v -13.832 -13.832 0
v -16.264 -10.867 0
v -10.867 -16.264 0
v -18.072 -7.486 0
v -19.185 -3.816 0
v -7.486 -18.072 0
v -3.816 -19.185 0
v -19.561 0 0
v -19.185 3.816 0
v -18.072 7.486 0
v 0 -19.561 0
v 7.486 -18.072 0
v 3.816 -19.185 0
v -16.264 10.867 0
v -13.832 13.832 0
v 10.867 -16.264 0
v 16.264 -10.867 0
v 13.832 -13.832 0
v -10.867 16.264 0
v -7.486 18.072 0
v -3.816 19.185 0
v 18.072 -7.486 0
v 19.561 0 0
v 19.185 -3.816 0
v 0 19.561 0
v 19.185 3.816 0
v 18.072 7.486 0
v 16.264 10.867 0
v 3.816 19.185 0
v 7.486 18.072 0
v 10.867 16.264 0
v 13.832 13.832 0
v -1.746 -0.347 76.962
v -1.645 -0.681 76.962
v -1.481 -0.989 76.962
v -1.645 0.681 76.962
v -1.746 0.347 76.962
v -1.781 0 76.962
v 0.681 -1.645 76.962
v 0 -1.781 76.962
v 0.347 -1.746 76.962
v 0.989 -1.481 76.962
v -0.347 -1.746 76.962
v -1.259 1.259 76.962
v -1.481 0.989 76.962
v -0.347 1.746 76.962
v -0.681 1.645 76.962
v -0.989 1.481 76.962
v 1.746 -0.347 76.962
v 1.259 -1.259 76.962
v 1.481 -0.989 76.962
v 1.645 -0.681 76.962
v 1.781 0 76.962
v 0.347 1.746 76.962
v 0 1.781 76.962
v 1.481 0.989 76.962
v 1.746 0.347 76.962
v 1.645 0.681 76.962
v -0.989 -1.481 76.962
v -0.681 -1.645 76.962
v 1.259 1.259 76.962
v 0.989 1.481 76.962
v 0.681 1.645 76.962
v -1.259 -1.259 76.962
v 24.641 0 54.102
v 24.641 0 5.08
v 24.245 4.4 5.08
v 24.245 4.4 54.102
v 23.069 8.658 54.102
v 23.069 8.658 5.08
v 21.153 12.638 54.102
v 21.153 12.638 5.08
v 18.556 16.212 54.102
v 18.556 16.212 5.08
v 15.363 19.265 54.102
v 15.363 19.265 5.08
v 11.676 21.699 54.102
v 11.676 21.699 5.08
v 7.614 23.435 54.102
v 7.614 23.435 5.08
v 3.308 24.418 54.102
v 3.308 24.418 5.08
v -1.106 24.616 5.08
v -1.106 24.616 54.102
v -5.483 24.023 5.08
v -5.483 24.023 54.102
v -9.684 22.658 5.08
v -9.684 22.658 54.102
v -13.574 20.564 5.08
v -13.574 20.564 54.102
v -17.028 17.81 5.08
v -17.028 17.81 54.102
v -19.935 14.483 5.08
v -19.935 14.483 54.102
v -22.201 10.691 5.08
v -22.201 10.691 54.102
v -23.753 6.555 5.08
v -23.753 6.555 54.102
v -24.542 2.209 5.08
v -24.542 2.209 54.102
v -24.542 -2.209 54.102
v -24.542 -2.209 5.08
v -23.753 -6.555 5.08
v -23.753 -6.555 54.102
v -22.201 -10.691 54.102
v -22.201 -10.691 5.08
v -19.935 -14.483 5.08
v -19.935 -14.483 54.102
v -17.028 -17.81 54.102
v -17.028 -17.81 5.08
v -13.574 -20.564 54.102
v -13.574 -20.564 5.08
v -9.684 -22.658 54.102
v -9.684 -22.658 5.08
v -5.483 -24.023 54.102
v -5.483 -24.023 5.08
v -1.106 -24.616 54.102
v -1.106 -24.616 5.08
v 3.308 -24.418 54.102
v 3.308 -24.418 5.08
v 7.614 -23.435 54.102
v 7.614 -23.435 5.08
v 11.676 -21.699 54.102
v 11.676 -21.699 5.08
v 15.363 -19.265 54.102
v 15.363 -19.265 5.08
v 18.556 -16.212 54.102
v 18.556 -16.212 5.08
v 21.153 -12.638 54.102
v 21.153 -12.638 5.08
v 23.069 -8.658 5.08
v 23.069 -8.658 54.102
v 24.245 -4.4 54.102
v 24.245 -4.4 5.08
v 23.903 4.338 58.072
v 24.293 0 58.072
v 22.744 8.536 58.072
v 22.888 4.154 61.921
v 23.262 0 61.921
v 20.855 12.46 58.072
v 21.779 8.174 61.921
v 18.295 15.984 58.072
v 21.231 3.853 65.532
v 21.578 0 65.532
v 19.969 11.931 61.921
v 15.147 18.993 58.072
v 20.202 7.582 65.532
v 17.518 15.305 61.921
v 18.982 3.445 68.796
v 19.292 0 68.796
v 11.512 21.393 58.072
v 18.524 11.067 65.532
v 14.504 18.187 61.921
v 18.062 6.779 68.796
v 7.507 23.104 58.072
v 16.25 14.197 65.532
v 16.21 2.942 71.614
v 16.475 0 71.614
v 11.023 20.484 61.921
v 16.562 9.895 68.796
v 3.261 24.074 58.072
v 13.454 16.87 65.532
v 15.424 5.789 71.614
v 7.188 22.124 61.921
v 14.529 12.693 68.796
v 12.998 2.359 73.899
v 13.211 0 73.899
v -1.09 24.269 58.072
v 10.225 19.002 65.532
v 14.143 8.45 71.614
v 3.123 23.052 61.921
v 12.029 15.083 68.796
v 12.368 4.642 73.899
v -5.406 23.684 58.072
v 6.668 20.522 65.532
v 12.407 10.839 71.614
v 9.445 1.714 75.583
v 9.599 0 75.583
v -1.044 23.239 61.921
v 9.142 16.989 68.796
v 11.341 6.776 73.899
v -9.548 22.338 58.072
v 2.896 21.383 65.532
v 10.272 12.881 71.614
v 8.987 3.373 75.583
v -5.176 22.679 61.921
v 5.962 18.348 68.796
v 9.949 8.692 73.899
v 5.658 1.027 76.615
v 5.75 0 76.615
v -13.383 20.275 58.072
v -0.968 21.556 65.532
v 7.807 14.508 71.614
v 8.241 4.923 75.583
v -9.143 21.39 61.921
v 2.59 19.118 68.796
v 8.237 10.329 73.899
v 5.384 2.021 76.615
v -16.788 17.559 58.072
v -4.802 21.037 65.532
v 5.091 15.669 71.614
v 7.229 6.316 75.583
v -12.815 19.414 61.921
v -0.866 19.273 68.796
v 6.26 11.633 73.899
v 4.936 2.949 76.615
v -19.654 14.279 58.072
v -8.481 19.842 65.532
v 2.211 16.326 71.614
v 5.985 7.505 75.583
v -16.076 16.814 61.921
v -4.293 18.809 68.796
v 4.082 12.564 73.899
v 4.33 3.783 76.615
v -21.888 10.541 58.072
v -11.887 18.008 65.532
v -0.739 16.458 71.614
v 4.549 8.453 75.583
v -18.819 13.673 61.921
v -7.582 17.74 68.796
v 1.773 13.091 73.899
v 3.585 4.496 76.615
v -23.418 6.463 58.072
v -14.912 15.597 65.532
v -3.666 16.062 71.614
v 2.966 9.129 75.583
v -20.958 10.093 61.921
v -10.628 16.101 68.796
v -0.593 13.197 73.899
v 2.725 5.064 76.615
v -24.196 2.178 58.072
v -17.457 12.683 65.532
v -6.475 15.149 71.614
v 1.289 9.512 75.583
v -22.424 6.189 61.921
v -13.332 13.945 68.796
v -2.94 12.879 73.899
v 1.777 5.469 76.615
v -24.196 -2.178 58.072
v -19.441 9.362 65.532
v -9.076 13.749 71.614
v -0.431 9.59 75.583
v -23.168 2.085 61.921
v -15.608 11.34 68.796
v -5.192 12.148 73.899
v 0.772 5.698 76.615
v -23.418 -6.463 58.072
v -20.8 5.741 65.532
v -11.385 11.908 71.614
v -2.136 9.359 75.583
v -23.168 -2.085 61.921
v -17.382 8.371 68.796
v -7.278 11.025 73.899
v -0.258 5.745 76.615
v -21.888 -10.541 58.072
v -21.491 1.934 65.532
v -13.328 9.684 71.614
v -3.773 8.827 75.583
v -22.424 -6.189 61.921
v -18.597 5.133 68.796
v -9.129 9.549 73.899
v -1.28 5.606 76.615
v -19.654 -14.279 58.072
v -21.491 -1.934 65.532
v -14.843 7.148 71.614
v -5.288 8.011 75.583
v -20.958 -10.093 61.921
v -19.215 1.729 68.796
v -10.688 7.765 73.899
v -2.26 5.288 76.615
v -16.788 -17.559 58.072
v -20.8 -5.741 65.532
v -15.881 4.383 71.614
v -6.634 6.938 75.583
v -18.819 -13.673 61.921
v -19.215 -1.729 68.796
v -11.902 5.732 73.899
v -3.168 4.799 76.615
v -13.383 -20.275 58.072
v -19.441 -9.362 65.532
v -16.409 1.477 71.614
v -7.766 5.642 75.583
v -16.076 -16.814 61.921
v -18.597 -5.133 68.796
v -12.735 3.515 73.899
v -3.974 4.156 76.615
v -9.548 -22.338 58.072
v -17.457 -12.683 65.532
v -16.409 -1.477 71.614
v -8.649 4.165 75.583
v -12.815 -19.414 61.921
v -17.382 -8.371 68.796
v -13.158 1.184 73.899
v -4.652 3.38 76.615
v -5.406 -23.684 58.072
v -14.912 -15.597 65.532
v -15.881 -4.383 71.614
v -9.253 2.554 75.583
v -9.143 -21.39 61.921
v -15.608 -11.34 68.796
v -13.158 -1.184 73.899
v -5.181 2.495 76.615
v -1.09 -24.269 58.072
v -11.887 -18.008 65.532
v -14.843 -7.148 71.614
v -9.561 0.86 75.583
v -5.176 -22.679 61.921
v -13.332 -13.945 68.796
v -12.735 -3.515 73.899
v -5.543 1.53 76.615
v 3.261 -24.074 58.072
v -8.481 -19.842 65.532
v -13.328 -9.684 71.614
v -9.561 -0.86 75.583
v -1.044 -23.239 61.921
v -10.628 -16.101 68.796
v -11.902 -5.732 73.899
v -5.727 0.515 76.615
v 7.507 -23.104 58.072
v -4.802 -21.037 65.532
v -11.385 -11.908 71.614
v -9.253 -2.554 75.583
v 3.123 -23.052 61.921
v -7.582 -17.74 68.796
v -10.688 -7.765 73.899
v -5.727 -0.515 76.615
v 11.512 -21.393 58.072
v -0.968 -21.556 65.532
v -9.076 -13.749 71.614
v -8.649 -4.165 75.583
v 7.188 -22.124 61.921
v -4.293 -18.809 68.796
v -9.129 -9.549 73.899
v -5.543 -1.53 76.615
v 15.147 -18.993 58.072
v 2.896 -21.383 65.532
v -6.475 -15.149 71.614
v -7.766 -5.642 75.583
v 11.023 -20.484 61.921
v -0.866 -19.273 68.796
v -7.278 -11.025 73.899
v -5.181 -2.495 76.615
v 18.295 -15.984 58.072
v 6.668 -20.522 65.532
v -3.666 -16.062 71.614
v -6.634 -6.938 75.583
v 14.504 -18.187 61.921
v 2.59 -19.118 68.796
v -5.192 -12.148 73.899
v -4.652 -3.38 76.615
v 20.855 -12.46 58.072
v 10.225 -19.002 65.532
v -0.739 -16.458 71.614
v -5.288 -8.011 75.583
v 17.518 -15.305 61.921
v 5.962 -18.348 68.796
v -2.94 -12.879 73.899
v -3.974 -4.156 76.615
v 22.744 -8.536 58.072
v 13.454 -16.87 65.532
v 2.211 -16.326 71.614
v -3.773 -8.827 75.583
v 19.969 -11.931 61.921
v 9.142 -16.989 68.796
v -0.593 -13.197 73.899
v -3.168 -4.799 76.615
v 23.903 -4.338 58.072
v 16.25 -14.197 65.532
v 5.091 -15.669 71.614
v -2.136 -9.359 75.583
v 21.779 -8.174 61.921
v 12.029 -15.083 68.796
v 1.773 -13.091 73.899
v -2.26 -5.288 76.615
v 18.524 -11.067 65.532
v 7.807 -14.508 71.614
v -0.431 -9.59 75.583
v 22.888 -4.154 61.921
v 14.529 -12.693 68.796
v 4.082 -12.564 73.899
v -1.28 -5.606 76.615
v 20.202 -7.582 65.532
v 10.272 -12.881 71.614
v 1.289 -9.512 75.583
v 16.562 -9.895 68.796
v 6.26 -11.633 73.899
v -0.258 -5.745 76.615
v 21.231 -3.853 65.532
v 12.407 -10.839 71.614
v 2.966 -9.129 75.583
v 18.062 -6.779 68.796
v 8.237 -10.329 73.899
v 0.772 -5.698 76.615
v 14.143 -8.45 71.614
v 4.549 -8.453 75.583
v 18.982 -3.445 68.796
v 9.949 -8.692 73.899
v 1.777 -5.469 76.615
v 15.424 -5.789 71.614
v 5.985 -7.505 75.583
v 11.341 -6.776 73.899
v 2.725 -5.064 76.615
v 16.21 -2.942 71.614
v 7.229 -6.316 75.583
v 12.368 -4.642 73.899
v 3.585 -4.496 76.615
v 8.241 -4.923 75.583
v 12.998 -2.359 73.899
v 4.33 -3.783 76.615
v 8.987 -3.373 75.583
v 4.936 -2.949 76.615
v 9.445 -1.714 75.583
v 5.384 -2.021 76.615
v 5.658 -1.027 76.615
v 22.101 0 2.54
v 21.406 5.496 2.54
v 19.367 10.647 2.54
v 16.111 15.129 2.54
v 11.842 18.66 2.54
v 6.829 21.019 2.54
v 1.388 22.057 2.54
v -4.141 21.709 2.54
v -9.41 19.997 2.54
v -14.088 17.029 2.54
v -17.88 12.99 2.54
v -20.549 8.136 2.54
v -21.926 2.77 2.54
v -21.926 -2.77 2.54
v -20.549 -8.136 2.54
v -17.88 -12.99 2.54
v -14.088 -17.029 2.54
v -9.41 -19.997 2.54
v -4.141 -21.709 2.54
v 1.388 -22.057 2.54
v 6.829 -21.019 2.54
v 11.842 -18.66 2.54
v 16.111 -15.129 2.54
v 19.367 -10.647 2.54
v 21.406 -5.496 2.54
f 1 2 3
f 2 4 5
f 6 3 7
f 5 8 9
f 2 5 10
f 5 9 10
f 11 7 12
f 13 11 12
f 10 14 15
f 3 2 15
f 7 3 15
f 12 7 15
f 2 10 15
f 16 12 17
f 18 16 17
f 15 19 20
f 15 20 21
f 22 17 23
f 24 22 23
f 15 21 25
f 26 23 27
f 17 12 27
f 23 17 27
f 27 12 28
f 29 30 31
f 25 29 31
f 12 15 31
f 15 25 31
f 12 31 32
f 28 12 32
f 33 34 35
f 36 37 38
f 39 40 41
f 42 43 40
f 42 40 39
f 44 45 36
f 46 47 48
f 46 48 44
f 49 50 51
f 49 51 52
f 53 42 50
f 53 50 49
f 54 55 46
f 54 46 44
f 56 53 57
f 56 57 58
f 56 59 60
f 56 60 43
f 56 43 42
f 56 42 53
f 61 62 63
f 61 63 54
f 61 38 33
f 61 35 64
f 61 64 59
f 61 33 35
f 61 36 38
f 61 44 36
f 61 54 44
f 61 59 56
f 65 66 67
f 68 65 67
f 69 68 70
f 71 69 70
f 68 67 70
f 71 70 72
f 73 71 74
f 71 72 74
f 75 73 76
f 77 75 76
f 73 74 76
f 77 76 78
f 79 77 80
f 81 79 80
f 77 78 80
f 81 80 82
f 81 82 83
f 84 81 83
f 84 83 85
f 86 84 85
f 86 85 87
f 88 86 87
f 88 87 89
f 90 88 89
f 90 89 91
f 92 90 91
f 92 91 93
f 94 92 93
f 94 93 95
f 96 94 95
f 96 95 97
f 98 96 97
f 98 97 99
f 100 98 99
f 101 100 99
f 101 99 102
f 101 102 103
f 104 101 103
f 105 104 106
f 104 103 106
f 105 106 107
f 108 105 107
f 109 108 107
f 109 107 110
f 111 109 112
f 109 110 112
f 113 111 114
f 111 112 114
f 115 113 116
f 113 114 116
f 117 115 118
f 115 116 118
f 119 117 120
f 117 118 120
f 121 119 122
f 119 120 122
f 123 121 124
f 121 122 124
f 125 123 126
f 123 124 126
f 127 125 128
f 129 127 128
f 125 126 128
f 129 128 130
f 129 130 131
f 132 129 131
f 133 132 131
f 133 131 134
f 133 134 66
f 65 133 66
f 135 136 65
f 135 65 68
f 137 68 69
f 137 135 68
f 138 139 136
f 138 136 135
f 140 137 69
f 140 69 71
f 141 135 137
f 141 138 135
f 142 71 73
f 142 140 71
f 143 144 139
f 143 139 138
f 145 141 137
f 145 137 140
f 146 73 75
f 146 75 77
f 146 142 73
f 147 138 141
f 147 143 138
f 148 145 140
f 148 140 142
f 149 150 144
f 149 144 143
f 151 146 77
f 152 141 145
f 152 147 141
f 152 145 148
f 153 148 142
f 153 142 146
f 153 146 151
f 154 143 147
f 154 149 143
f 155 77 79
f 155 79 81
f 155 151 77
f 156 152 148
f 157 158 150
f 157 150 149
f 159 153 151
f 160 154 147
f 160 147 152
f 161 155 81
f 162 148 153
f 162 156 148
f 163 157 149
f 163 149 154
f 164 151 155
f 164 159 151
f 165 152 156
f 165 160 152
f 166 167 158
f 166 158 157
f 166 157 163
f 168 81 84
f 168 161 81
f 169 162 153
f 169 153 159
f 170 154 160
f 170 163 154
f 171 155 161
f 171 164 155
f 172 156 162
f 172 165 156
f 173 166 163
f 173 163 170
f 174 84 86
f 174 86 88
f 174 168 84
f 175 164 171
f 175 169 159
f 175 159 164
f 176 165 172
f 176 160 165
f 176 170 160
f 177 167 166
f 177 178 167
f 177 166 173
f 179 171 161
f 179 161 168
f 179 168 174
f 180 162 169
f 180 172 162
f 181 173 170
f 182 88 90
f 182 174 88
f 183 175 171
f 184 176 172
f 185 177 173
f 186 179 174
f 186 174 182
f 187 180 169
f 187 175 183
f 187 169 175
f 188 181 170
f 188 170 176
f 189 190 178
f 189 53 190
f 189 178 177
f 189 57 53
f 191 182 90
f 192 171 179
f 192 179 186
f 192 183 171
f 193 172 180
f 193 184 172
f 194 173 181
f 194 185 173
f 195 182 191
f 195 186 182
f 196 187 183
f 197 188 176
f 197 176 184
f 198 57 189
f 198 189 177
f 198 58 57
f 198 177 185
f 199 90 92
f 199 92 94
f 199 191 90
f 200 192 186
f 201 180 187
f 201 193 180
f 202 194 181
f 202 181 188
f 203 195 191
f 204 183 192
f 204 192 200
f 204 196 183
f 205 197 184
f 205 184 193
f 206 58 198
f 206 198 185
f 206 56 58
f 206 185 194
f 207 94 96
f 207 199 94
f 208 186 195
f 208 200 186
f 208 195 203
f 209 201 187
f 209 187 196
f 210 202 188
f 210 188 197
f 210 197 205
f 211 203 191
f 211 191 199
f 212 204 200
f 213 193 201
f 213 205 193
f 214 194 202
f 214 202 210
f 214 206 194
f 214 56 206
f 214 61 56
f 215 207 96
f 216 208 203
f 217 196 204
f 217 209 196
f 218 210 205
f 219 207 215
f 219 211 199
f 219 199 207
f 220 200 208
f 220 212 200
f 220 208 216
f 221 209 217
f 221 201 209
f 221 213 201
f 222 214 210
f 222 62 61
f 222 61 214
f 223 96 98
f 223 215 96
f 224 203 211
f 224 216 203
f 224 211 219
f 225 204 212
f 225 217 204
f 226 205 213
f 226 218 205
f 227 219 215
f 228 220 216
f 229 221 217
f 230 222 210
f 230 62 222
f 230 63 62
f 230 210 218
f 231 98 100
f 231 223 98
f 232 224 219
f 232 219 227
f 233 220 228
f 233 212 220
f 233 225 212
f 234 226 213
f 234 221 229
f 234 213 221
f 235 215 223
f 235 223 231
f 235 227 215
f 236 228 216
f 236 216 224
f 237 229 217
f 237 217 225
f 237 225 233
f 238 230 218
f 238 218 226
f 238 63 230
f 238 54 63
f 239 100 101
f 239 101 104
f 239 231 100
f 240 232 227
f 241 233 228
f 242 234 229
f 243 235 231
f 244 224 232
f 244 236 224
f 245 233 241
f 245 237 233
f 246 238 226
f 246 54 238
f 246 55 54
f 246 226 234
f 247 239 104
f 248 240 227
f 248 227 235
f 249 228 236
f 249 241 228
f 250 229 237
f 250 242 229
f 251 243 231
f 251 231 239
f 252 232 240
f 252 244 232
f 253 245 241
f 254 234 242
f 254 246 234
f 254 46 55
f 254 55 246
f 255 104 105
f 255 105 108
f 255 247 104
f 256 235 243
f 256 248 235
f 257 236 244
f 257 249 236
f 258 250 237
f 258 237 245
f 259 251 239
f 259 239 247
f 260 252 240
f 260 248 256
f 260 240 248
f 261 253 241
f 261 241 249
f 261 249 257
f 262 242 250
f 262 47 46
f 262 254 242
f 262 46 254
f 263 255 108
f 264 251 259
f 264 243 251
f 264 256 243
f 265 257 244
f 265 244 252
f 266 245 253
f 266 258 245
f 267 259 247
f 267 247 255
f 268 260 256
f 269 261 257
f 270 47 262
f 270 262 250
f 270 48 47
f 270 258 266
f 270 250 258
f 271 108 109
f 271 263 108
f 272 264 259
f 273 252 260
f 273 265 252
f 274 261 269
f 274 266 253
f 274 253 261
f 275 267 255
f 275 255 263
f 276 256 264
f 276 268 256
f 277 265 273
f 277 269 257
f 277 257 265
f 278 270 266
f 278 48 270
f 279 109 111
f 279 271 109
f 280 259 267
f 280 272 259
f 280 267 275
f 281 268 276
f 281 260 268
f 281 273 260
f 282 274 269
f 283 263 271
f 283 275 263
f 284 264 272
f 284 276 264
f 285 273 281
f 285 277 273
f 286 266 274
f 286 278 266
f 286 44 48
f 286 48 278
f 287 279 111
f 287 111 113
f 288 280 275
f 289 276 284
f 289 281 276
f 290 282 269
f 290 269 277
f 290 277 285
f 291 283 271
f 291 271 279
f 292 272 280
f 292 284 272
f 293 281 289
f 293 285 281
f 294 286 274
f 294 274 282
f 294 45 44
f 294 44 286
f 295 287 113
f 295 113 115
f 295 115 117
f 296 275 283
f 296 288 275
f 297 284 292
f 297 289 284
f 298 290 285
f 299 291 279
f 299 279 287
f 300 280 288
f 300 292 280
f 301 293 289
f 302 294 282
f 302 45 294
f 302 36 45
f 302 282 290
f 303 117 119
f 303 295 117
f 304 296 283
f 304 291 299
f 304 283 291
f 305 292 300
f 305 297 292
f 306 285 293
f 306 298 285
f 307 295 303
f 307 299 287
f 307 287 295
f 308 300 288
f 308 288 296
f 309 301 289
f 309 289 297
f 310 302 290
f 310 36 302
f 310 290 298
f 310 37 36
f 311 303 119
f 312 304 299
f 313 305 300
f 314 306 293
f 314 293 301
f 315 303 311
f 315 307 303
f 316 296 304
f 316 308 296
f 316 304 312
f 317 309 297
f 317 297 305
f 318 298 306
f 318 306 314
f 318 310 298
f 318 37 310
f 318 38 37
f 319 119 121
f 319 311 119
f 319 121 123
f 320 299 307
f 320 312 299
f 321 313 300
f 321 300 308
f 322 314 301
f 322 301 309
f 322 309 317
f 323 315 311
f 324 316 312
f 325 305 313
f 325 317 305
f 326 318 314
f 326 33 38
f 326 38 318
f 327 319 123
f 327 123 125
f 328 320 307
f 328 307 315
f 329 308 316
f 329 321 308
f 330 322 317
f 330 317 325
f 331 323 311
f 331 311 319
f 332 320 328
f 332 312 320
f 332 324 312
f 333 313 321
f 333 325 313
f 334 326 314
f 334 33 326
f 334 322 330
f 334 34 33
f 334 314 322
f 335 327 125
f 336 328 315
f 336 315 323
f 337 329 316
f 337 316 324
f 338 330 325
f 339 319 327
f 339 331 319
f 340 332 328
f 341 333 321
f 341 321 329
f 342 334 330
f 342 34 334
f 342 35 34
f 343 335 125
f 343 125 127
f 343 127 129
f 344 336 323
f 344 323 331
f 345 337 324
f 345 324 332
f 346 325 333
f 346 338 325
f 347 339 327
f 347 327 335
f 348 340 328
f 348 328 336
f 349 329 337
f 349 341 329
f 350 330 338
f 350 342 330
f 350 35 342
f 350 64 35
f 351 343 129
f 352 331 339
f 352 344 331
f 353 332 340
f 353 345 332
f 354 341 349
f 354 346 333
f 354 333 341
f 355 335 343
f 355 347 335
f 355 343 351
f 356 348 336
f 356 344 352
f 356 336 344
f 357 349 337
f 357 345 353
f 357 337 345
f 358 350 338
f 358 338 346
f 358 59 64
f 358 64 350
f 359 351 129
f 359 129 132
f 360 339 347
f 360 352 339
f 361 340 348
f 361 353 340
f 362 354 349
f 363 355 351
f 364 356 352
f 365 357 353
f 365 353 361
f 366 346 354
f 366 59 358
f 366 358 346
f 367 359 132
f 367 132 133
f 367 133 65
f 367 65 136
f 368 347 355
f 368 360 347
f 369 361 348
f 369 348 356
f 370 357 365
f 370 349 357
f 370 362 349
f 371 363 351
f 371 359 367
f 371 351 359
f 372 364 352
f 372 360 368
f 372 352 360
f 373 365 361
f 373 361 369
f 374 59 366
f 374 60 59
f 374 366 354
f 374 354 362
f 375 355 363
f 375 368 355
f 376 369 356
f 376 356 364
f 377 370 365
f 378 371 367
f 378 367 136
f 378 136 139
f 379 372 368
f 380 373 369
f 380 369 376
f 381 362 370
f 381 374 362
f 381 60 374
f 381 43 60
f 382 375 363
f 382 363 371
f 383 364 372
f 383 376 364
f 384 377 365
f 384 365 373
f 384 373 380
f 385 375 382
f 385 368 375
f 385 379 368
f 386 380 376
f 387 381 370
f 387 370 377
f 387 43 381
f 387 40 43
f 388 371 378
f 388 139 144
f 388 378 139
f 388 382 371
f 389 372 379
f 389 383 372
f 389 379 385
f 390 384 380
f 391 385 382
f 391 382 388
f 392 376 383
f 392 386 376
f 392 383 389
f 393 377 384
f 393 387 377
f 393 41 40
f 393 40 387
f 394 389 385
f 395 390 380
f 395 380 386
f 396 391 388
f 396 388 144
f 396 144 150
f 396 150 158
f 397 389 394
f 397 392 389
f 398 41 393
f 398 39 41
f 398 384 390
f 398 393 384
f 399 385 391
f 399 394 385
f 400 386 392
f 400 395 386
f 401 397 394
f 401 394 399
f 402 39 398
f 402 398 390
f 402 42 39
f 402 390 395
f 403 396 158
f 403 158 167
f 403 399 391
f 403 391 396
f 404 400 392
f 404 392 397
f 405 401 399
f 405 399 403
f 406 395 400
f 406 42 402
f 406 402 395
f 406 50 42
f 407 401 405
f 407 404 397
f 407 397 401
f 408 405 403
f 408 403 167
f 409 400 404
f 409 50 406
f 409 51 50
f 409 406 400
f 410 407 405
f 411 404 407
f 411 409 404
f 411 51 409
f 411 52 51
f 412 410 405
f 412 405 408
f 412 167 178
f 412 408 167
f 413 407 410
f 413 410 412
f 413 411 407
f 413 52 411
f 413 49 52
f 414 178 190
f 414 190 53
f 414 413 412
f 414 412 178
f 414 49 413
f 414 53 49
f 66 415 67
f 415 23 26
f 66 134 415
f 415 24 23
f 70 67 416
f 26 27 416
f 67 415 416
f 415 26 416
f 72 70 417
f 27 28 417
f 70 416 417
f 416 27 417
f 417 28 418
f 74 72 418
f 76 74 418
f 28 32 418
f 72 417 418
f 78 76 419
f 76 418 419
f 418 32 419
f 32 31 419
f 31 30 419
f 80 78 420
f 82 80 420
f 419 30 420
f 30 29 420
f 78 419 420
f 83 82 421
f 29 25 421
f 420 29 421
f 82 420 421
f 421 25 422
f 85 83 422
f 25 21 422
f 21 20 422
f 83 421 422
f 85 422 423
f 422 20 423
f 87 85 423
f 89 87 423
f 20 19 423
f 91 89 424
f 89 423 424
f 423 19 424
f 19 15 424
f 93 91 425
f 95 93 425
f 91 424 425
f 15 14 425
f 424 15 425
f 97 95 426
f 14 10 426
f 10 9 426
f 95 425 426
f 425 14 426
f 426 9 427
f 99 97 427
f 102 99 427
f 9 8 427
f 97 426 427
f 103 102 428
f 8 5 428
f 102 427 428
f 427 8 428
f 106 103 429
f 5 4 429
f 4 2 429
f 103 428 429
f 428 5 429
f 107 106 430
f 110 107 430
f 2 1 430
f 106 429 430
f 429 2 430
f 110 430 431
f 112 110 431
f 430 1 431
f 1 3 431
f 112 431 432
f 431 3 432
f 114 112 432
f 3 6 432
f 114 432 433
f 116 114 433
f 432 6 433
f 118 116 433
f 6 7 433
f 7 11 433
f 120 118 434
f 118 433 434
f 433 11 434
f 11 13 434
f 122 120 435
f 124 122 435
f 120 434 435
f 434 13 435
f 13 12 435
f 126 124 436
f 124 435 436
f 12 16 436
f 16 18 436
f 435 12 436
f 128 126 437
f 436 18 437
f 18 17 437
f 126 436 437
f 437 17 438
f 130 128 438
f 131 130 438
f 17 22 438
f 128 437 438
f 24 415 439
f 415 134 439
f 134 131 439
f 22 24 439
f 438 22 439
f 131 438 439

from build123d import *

# Parameters (mm, degrees)
F0_R     = 24.6407152677
F1_DEPTH = 51.562
F2_SIZE  = 5.08
F3_DEPTH = 25.4
F4_R     = 22.86


with BuildPart() as f1:
    # F0 (on Top) → F1 (new body)
    with BuildSketch(Plane.XY):
        Circle(F0_R)
    extrude(amount=F1_DEPTH)

    # F2
    f2_edges = [f1.edges().sort_by_distance(p)[0] for p in [
        (-24.640715, 0, 0),
    ]]
    chamfer(f2_edges, length=F2_SIZE)

    # F3 (add): a face of the model
    f3_faces = [f1.faces().sort_by_distance(p)[0] for p in [
        (0, 0, 51.562),
    ]]
    extrude(f3_faces, amount=F3_DEPTH)

    # F4
    f4_edges = [f1.edges().sort_by_distance(p)[0] for p in [
        (-24.640715, 0, 76.962),
    ]]
    fillet(f4_edges, radius=F4_R)


solid = f1.part
